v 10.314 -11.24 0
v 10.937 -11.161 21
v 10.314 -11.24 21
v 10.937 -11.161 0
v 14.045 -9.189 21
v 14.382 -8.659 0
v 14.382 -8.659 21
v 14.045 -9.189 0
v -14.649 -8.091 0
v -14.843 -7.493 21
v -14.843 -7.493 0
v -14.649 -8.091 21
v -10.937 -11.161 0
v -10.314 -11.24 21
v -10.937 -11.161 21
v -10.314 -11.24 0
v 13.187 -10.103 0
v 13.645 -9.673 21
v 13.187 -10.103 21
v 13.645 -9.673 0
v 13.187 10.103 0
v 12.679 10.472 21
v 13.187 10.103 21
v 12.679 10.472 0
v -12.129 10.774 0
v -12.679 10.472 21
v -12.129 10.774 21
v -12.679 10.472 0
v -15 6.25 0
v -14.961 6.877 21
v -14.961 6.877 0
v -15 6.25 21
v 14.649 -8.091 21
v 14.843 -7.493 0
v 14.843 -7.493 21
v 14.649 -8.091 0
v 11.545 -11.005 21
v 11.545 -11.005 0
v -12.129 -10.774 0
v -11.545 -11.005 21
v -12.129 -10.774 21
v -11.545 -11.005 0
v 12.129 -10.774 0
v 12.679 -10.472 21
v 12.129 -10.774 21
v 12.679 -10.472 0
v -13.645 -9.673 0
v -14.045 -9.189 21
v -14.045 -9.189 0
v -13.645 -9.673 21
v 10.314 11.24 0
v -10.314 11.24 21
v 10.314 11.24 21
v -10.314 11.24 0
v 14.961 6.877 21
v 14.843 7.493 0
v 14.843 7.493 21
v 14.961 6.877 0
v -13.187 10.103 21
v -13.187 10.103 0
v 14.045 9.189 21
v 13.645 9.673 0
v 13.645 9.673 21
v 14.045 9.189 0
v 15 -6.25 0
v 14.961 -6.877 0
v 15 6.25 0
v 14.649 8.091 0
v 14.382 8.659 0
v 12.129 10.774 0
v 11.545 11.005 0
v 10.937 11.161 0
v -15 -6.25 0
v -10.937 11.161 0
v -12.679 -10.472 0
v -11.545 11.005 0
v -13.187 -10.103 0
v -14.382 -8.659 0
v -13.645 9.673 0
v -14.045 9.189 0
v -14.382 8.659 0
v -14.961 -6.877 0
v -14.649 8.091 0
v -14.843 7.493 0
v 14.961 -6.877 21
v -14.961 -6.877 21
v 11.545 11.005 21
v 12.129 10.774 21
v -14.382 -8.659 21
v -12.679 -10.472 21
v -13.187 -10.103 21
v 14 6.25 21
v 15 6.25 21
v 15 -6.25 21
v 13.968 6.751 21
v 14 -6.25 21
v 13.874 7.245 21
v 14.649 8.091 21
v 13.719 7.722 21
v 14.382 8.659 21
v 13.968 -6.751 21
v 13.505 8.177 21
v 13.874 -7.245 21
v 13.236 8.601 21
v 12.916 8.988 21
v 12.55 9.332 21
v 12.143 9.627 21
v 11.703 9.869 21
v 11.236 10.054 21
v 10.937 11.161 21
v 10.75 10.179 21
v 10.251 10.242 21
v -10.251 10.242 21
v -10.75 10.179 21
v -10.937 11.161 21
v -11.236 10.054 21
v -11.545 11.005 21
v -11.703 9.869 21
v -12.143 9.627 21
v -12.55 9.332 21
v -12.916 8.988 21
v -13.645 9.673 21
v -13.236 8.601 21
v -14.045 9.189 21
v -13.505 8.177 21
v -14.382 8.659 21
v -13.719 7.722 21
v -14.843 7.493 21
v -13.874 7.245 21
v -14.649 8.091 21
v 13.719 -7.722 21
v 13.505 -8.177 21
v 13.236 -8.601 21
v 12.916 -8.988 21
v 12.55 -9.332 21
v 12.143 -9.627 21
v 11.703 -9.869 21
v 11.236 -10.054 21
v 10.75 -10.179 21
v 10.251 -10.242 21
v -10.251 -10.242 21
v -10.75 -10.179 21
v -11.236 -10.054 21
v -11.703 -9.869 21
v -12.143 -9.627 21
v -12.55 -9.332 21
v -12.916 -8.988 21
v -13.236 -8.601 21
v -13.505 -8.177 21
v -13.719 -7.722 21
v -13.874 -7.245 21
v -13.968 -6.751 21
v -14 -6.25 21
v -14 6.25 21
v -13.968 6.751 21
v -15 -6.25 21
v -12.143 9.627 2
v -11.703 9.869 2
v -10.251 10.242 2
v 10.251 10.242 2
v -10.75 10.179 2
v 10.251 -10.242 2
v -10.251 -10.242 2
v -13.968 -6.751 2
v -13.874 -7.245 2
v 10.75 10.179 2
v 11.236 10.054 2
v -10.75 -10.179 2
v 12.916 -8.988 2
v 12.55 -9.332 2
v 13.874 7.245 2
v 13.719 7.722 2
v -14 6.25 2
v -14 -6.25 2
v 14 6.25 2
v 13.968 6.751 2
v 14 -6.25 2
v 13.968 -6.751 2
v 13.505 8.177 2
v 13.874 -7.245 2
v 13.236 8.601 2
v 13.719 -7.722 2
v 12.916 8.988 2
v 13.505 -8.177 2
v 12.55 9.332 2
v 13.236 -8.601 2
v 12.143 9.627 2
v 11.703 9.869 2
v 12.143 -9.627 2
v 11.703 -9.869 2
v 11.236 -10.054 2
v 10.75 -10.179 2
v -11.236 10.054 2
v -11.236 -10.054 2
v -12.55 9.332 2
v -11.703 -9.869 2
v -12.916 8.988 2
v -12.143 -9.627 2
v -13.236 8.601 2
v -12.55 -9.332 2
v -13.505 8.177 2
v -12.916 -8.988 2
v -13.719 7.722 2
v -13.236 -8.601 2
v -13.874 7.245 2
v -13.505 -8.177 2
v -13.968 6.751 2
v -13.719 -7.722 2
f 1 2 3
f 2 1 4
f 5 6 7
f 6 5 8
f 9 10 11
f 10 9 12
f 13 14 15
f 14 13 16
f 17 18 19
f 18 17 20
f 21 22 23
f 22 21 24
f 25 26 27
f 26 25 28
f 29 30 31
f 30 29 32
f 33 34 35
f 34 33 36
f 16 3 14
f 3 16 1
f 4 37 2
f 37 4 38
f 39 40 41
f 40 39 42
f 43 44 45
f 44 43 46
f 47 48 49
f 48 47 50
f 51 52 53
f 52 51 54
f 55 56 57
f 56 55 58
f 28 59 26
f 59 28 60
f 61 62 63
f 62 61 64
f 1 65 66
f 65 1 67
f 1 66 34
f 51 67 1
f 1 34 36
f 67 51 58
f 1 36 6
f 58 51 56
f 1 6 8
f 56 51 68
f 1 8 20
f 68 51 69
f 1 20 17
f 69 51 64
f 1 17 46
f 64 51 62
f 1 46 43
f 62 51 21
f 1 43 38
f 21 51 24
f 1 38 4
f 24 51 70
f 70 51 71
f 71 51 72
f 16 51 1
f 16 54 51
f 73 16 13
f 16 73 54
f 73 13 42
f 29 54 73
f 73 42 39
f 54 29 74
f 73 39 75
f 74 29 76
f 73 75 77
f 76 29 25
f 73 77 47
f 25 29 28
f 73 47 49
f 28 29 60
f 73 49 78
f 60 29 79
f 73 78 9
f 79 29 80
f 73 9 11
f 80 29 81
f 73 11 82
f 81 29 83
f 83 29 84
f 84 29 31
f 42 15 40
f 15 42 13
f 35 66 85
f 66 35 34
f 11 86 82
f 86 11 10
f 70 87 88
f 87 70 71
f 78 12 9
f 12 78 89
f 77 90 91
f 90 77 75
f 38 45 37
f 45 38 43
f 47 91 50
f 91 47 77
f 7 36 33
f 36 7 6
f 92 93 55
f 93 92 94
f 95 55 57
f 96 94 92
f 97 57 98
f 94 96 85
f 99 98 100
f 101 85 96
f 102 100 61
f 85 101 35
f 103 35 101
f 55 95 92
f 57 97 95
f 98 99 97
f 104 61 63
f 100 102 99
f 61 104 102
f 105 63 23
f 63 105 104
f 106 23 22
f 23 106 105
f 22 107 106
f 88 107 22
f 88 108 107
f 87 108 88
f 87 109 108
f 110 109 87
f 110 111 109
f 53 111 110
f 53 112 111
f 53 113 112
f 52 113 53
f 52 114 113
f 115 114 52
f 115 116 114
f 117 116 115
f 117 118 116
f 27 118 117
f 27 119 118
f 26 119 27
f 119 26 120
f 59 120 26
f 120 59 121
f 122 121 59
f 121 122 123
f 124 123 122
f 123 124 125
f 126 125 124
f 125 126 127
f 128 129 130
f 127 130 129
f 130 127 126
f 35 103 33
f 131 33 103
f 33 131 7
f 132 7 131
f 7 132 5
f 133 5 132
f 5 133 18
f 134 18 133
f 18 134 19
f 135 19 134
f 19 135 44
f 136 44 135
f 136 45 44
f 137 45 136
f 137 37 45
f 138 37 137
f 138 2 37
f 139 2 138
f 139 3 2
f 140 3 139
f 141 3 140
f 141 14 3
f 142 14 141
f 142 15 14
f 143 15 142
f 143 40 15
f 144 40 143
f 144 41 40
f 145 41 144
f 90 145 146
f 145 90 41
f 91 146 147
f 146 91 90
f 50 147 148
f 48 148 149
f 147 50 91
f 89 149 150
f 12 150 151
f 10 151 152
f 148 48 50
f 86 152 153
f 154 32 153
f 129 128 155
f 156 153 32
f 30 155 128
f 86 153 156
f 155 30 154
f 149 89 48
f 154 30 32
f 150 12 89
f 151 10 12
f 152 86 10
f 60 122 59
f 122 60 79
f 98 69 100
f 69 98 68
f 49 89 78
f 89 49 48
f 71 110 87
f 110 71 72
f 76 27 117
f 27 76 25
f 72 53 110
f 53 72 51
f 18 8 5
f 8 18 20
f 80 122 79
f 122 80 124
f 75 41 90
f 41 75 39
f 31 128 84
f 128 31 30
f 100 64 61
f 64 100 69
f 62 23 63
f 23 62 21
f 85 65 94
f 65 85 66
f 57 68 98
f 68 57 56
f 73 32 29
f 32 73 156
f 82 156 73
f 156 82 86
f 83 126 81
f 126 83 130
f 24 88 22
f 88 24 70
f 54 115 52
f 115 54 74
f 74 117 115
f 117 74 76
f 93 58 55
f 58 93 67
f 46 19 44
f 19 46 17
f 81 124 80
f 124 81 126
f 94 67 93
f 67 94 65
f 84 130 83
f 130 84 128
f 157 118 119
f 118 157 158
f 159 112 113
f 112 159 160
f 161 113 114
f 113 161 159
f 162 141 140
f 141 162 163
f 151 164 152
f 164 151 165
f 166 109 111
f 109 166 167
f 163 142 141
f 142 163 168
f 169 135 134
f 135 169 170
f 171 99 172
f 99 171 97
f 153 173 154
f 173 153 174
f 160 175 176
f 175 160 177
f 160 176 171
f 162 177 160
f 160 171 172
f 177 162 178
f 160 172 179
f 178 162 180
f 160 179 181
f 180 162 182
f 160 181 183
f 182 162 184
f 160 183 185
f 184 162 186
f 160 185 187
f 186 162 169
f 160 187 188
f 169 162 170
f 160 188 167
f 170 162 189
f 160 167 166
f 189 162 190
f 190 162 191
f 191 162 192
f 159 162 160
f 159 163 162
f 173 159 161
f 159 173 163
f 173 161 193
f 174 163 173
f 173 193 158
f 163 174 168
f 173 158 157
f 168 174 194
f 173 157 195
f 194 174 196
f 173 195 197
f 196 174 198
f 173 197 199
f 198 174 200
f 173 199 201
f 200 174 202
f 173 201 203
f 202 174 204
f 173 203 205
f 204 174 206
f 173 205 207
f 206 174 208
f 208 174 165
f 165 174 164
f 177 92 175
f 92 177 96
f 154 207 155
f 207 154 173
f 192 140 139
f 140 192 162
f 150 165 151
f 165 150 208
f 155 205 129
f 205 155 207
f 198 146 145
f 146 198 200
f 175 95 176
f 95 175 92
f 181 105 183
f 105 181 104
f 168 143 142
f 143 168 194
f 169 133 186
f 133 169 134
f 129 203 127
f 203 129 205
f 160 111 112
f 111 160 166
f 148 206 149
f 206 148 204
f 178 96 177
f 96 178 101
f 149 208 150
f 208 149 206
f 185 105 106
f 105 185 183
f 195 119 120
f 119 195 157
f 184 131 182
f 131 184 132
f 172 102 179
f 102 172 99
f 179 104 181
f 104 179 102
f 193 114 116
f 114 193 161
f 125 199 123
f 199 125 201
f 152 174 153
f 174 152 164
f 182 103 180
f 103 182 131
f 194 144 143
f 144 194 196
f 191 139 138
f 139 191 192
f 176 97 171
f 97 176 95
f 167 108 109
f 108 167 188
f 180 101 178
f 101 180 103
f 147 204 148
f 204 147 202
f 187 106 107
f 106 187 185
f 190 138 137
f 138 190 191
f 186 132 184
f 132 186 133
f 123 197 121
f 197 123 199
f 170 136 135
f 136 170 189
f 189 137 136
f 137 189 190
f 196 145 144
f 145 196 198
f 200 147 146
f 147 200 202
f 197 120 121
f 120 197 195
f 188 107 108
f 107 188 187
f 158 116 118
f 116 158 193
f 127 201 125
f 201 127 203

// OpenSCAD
$fn = 50;


difference() {
	union() {
		hull() {
			translate(v = [-10.0000000000, 6.2500000000, 0]) {
				cylinder(h = 21, r = 5);
			}
			translate(v = [10.0000000000, 6.2500000000, 0]) {
				cylinder(h = 21, r = 5);
			}
			translate(v = [-10.0000000000, -6.2500000000, 0]) {
				cylinder(h = 21, r = 5);
			}
			translate(v = [10.0000000000, -6.2500000000, 0]) {
				cylinder(h = 21, r = 5);
			}
		}
	}
	union() {
		translate(v = [0, 0, 2]) {
			hull() {
				translate(v = [-10.0000000000, 6.2500000000, 0]) {
					cylinder(h = 19, r = 4);
				}
				translate(v = [10.0000000000, 6.2500000000, 0]) {
					cylinder(h = 19, r = 4);
				}
				translate(v = [-10.0000000000, -6.2500000000, 0]) {
					cylinder(h = 19, r = 4);
				}
				translate(v = [10.0000000000, -6.2500000000, 0]) {
					cylinder(h = 19, r = 4);
				}
			}
		}
	}
}
